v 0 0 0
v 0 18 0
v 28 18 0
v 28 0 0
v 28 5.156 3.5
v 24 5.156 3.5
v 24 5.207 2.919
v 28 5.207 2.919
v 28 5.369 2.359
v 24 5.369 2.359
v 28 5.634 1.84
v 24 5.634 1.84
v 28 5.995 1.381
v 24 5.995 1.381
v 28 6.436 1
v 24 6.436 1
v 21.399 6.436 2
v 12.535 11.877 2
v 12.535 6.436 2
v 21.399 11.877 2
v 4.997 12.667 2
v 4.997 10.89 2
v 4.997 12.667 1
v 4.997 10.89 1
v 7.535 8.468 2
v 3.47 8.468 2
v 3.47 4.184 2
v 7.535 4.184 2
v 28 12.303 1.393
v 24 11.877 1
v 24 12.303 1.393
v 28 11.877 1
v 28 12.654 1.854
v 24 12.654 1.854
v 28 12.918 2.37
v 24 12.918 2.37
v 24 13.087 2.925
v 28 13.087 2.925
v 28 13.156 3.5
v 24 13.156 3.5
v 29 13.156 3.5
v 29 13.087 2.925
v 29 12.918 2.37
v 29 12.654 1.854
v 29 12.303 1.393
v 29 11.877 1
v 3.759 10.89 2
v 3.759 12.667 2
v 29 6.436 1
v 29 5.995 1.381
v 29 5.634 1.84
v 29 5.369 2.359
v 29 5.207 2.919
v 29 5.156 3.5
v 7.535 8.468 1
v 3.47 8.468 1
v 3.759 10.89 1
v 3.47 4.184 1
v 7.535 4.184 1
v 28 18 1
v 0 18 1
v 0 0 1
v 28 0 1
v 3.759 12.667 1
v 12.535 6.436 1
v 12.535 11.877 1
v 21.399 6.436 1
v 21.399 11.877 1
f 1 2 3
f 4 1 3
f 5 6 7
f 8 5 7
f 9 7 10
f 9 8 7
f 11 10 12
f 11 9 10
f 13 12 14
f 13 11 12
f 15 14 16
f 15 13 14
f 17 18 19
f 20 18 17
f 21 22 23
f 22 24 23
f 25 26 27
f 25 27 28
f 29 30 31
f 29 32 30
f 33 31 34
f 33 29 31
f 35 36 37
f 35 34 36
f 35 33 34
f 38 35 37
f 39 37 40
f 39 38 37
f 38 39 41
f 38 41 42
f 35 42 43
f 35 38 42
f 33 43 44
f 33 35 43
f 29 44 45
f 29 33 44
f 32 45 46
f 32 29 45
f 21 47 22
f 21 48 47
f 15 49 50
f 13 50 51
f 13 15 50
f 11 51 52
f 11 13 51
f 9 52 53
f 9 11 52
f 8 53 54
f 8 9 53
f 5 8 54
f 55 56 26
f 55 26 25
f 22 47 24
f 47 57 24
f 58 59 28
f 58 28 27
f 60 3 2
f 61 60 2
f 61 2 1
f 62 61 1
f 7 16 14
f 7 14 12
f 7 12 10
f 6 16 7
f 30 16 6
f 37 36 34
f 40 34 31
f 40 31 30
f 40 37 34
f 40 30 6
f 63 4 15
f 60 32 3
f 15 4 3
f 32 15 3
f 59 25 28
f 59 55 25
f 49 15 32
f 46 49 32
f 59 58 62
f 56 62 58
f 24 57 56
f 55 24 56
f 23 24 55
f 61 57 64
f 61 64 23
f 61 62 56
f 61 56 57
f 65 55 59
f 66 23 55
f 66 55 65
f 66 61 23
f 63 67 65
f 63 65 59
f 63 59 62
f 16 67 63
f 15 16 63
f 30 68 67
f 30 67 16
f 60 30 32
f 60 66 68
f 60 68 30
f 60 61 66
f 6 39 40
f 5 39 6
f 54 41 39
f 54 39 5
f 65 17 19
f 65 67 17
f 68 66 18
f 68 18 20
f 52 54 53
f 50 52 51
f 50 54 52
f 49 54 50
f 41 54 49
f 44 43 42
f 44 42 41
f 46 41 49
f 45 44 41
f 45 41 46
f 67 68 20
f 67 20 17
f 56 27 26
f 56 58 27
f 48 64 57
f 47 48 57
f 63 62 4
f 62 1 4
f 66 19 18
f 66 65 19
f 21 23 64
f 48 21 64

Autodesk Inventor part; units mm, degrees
ref_plane "YZ Plane" through (0, 0, 0) normal (1, 0, 0) x (0, 1, 0)
ref_plane "XZ Plane" through (0, 0, 0) normal (0, 1, 0) x (-1, 0, 0)
ref_plane "XY Plane" through (0, 0, 0) normal (0, 0, 1) x (1, 0, 0)
sketch "Sketch1" plane through (0, 0, 0) normal (0, 0, 1) x (1, 0, 0)
  line L0 (0, 0) -> (28, 0)
  line L1 (28, 0) -> (28, 18)
  line L2 (28, 18) -> (0, 18)
  line L3 (0, 18) -> (0, 0)
  dimension "d0" = 28
  dimension "d1" = 18
  dimension "d2" = 28
extrude "Extrusion1" add sketch "Sketch1" along normal blind 1
sketch "Sketch2" plane through (0, 0, 1) normal (0, 0, 1) x (1, 0, 0)
  line L0 (21.3992, 11.8771) -> (21.3992, 6.4359)
  line L1 (21.3992, 6.4359) -> (12.5353, 6.4359)
  line L2 (12.5353, 6.4359) -> (12.5353, 11.8771)
  line L3 (12.5353, 11.8771) -> (21.3992, 11.8771)
  line L4 (3.7591, 12.6669) -> (3.7591, 10.8901)
  line L5 (3.7591, 10.8901) -> (4.997, 10.8901)
  line L6 (4.997, 10.8901) -> (4.997, 12.6669)
  line L7 (4.997, 12.6669) -> (3.7591, 12.6669)
  line L8 (3.4697, 8.4681) -> (7.5353, 8.4681)
  line L9 (7.5353, 8.4681) -> (7.5353, 4.1843)
  line L10 (7.5353, 4.1843) -> (3.4697, 4.1843)
  line L11 (3.4697, 4.1843) -> (3.4697, 8.4681)
  point P0 (0, 0)
extrude "Extrusion2" add sketch "Sketch2" along normal blind 1
sketch "Sketch3" plane through (28, 0, 0) normal (1, 0, 0) x (0, 0, -1)
  line L0 (-1, 6.4359) -> (-1, 11.8771) projected
  line L1 (-1, 9.1565) -> (-3.5, 9.1565)
  line L2 (-3.5, 9.1565) -> (-3.5, 13.1565)
  line L3 (-3.5, 13.1565) -> (-3.5, 5.1565)
  line L4 (-2, 8.4681) -> (-2, 4.1843) projected
  line L5 (-2, 11.8771) -> (-2, 6.4359) projected
  line L6 (-2, 9.1565) -> (-2, 6.3262)
  arc A0 (-3.5, 5.1565) -> (-1, 6.4359) centre (-3.4729, 8.1858) ccw
  arc A1 (-1, 11.8771) -> (-3.5, 13.1565) centre (-3.6026, 9.8737) ccw
  line L7 (-1, 6.4359) -> (-1, 11.8771)
  point P0 (0, 0)
  dimension "d7" = 2.5
  dimension "d8" = 4
  dimension "d9" = 8
extrude "Extrusion3" add sketch "Sketch3" along normal blind 1
sketch "Sketch4" plane through (28, 0, 0) normal (-1, 0, 0) x (0, 0, 1)
  arc A0 (3.5, 13.1565) -> (1, 11.8771) centre (3.6026, 9.8737) ccw projected
  line L0 (1, 6.4359) -> (1, 11.8771) projected
  arc A1 (1, 6.4359) -> (3.5, 5.1565) centre (3.4729, 8.1858) ccw projected
  line L1 (3.5, 13.1565) -> (3.5, 5.1565) projected
  point P0 (0, 0)
extrude "Extrusion4" add sketch "Sketch4" along normal blind 4
properties part number "Regulador"
